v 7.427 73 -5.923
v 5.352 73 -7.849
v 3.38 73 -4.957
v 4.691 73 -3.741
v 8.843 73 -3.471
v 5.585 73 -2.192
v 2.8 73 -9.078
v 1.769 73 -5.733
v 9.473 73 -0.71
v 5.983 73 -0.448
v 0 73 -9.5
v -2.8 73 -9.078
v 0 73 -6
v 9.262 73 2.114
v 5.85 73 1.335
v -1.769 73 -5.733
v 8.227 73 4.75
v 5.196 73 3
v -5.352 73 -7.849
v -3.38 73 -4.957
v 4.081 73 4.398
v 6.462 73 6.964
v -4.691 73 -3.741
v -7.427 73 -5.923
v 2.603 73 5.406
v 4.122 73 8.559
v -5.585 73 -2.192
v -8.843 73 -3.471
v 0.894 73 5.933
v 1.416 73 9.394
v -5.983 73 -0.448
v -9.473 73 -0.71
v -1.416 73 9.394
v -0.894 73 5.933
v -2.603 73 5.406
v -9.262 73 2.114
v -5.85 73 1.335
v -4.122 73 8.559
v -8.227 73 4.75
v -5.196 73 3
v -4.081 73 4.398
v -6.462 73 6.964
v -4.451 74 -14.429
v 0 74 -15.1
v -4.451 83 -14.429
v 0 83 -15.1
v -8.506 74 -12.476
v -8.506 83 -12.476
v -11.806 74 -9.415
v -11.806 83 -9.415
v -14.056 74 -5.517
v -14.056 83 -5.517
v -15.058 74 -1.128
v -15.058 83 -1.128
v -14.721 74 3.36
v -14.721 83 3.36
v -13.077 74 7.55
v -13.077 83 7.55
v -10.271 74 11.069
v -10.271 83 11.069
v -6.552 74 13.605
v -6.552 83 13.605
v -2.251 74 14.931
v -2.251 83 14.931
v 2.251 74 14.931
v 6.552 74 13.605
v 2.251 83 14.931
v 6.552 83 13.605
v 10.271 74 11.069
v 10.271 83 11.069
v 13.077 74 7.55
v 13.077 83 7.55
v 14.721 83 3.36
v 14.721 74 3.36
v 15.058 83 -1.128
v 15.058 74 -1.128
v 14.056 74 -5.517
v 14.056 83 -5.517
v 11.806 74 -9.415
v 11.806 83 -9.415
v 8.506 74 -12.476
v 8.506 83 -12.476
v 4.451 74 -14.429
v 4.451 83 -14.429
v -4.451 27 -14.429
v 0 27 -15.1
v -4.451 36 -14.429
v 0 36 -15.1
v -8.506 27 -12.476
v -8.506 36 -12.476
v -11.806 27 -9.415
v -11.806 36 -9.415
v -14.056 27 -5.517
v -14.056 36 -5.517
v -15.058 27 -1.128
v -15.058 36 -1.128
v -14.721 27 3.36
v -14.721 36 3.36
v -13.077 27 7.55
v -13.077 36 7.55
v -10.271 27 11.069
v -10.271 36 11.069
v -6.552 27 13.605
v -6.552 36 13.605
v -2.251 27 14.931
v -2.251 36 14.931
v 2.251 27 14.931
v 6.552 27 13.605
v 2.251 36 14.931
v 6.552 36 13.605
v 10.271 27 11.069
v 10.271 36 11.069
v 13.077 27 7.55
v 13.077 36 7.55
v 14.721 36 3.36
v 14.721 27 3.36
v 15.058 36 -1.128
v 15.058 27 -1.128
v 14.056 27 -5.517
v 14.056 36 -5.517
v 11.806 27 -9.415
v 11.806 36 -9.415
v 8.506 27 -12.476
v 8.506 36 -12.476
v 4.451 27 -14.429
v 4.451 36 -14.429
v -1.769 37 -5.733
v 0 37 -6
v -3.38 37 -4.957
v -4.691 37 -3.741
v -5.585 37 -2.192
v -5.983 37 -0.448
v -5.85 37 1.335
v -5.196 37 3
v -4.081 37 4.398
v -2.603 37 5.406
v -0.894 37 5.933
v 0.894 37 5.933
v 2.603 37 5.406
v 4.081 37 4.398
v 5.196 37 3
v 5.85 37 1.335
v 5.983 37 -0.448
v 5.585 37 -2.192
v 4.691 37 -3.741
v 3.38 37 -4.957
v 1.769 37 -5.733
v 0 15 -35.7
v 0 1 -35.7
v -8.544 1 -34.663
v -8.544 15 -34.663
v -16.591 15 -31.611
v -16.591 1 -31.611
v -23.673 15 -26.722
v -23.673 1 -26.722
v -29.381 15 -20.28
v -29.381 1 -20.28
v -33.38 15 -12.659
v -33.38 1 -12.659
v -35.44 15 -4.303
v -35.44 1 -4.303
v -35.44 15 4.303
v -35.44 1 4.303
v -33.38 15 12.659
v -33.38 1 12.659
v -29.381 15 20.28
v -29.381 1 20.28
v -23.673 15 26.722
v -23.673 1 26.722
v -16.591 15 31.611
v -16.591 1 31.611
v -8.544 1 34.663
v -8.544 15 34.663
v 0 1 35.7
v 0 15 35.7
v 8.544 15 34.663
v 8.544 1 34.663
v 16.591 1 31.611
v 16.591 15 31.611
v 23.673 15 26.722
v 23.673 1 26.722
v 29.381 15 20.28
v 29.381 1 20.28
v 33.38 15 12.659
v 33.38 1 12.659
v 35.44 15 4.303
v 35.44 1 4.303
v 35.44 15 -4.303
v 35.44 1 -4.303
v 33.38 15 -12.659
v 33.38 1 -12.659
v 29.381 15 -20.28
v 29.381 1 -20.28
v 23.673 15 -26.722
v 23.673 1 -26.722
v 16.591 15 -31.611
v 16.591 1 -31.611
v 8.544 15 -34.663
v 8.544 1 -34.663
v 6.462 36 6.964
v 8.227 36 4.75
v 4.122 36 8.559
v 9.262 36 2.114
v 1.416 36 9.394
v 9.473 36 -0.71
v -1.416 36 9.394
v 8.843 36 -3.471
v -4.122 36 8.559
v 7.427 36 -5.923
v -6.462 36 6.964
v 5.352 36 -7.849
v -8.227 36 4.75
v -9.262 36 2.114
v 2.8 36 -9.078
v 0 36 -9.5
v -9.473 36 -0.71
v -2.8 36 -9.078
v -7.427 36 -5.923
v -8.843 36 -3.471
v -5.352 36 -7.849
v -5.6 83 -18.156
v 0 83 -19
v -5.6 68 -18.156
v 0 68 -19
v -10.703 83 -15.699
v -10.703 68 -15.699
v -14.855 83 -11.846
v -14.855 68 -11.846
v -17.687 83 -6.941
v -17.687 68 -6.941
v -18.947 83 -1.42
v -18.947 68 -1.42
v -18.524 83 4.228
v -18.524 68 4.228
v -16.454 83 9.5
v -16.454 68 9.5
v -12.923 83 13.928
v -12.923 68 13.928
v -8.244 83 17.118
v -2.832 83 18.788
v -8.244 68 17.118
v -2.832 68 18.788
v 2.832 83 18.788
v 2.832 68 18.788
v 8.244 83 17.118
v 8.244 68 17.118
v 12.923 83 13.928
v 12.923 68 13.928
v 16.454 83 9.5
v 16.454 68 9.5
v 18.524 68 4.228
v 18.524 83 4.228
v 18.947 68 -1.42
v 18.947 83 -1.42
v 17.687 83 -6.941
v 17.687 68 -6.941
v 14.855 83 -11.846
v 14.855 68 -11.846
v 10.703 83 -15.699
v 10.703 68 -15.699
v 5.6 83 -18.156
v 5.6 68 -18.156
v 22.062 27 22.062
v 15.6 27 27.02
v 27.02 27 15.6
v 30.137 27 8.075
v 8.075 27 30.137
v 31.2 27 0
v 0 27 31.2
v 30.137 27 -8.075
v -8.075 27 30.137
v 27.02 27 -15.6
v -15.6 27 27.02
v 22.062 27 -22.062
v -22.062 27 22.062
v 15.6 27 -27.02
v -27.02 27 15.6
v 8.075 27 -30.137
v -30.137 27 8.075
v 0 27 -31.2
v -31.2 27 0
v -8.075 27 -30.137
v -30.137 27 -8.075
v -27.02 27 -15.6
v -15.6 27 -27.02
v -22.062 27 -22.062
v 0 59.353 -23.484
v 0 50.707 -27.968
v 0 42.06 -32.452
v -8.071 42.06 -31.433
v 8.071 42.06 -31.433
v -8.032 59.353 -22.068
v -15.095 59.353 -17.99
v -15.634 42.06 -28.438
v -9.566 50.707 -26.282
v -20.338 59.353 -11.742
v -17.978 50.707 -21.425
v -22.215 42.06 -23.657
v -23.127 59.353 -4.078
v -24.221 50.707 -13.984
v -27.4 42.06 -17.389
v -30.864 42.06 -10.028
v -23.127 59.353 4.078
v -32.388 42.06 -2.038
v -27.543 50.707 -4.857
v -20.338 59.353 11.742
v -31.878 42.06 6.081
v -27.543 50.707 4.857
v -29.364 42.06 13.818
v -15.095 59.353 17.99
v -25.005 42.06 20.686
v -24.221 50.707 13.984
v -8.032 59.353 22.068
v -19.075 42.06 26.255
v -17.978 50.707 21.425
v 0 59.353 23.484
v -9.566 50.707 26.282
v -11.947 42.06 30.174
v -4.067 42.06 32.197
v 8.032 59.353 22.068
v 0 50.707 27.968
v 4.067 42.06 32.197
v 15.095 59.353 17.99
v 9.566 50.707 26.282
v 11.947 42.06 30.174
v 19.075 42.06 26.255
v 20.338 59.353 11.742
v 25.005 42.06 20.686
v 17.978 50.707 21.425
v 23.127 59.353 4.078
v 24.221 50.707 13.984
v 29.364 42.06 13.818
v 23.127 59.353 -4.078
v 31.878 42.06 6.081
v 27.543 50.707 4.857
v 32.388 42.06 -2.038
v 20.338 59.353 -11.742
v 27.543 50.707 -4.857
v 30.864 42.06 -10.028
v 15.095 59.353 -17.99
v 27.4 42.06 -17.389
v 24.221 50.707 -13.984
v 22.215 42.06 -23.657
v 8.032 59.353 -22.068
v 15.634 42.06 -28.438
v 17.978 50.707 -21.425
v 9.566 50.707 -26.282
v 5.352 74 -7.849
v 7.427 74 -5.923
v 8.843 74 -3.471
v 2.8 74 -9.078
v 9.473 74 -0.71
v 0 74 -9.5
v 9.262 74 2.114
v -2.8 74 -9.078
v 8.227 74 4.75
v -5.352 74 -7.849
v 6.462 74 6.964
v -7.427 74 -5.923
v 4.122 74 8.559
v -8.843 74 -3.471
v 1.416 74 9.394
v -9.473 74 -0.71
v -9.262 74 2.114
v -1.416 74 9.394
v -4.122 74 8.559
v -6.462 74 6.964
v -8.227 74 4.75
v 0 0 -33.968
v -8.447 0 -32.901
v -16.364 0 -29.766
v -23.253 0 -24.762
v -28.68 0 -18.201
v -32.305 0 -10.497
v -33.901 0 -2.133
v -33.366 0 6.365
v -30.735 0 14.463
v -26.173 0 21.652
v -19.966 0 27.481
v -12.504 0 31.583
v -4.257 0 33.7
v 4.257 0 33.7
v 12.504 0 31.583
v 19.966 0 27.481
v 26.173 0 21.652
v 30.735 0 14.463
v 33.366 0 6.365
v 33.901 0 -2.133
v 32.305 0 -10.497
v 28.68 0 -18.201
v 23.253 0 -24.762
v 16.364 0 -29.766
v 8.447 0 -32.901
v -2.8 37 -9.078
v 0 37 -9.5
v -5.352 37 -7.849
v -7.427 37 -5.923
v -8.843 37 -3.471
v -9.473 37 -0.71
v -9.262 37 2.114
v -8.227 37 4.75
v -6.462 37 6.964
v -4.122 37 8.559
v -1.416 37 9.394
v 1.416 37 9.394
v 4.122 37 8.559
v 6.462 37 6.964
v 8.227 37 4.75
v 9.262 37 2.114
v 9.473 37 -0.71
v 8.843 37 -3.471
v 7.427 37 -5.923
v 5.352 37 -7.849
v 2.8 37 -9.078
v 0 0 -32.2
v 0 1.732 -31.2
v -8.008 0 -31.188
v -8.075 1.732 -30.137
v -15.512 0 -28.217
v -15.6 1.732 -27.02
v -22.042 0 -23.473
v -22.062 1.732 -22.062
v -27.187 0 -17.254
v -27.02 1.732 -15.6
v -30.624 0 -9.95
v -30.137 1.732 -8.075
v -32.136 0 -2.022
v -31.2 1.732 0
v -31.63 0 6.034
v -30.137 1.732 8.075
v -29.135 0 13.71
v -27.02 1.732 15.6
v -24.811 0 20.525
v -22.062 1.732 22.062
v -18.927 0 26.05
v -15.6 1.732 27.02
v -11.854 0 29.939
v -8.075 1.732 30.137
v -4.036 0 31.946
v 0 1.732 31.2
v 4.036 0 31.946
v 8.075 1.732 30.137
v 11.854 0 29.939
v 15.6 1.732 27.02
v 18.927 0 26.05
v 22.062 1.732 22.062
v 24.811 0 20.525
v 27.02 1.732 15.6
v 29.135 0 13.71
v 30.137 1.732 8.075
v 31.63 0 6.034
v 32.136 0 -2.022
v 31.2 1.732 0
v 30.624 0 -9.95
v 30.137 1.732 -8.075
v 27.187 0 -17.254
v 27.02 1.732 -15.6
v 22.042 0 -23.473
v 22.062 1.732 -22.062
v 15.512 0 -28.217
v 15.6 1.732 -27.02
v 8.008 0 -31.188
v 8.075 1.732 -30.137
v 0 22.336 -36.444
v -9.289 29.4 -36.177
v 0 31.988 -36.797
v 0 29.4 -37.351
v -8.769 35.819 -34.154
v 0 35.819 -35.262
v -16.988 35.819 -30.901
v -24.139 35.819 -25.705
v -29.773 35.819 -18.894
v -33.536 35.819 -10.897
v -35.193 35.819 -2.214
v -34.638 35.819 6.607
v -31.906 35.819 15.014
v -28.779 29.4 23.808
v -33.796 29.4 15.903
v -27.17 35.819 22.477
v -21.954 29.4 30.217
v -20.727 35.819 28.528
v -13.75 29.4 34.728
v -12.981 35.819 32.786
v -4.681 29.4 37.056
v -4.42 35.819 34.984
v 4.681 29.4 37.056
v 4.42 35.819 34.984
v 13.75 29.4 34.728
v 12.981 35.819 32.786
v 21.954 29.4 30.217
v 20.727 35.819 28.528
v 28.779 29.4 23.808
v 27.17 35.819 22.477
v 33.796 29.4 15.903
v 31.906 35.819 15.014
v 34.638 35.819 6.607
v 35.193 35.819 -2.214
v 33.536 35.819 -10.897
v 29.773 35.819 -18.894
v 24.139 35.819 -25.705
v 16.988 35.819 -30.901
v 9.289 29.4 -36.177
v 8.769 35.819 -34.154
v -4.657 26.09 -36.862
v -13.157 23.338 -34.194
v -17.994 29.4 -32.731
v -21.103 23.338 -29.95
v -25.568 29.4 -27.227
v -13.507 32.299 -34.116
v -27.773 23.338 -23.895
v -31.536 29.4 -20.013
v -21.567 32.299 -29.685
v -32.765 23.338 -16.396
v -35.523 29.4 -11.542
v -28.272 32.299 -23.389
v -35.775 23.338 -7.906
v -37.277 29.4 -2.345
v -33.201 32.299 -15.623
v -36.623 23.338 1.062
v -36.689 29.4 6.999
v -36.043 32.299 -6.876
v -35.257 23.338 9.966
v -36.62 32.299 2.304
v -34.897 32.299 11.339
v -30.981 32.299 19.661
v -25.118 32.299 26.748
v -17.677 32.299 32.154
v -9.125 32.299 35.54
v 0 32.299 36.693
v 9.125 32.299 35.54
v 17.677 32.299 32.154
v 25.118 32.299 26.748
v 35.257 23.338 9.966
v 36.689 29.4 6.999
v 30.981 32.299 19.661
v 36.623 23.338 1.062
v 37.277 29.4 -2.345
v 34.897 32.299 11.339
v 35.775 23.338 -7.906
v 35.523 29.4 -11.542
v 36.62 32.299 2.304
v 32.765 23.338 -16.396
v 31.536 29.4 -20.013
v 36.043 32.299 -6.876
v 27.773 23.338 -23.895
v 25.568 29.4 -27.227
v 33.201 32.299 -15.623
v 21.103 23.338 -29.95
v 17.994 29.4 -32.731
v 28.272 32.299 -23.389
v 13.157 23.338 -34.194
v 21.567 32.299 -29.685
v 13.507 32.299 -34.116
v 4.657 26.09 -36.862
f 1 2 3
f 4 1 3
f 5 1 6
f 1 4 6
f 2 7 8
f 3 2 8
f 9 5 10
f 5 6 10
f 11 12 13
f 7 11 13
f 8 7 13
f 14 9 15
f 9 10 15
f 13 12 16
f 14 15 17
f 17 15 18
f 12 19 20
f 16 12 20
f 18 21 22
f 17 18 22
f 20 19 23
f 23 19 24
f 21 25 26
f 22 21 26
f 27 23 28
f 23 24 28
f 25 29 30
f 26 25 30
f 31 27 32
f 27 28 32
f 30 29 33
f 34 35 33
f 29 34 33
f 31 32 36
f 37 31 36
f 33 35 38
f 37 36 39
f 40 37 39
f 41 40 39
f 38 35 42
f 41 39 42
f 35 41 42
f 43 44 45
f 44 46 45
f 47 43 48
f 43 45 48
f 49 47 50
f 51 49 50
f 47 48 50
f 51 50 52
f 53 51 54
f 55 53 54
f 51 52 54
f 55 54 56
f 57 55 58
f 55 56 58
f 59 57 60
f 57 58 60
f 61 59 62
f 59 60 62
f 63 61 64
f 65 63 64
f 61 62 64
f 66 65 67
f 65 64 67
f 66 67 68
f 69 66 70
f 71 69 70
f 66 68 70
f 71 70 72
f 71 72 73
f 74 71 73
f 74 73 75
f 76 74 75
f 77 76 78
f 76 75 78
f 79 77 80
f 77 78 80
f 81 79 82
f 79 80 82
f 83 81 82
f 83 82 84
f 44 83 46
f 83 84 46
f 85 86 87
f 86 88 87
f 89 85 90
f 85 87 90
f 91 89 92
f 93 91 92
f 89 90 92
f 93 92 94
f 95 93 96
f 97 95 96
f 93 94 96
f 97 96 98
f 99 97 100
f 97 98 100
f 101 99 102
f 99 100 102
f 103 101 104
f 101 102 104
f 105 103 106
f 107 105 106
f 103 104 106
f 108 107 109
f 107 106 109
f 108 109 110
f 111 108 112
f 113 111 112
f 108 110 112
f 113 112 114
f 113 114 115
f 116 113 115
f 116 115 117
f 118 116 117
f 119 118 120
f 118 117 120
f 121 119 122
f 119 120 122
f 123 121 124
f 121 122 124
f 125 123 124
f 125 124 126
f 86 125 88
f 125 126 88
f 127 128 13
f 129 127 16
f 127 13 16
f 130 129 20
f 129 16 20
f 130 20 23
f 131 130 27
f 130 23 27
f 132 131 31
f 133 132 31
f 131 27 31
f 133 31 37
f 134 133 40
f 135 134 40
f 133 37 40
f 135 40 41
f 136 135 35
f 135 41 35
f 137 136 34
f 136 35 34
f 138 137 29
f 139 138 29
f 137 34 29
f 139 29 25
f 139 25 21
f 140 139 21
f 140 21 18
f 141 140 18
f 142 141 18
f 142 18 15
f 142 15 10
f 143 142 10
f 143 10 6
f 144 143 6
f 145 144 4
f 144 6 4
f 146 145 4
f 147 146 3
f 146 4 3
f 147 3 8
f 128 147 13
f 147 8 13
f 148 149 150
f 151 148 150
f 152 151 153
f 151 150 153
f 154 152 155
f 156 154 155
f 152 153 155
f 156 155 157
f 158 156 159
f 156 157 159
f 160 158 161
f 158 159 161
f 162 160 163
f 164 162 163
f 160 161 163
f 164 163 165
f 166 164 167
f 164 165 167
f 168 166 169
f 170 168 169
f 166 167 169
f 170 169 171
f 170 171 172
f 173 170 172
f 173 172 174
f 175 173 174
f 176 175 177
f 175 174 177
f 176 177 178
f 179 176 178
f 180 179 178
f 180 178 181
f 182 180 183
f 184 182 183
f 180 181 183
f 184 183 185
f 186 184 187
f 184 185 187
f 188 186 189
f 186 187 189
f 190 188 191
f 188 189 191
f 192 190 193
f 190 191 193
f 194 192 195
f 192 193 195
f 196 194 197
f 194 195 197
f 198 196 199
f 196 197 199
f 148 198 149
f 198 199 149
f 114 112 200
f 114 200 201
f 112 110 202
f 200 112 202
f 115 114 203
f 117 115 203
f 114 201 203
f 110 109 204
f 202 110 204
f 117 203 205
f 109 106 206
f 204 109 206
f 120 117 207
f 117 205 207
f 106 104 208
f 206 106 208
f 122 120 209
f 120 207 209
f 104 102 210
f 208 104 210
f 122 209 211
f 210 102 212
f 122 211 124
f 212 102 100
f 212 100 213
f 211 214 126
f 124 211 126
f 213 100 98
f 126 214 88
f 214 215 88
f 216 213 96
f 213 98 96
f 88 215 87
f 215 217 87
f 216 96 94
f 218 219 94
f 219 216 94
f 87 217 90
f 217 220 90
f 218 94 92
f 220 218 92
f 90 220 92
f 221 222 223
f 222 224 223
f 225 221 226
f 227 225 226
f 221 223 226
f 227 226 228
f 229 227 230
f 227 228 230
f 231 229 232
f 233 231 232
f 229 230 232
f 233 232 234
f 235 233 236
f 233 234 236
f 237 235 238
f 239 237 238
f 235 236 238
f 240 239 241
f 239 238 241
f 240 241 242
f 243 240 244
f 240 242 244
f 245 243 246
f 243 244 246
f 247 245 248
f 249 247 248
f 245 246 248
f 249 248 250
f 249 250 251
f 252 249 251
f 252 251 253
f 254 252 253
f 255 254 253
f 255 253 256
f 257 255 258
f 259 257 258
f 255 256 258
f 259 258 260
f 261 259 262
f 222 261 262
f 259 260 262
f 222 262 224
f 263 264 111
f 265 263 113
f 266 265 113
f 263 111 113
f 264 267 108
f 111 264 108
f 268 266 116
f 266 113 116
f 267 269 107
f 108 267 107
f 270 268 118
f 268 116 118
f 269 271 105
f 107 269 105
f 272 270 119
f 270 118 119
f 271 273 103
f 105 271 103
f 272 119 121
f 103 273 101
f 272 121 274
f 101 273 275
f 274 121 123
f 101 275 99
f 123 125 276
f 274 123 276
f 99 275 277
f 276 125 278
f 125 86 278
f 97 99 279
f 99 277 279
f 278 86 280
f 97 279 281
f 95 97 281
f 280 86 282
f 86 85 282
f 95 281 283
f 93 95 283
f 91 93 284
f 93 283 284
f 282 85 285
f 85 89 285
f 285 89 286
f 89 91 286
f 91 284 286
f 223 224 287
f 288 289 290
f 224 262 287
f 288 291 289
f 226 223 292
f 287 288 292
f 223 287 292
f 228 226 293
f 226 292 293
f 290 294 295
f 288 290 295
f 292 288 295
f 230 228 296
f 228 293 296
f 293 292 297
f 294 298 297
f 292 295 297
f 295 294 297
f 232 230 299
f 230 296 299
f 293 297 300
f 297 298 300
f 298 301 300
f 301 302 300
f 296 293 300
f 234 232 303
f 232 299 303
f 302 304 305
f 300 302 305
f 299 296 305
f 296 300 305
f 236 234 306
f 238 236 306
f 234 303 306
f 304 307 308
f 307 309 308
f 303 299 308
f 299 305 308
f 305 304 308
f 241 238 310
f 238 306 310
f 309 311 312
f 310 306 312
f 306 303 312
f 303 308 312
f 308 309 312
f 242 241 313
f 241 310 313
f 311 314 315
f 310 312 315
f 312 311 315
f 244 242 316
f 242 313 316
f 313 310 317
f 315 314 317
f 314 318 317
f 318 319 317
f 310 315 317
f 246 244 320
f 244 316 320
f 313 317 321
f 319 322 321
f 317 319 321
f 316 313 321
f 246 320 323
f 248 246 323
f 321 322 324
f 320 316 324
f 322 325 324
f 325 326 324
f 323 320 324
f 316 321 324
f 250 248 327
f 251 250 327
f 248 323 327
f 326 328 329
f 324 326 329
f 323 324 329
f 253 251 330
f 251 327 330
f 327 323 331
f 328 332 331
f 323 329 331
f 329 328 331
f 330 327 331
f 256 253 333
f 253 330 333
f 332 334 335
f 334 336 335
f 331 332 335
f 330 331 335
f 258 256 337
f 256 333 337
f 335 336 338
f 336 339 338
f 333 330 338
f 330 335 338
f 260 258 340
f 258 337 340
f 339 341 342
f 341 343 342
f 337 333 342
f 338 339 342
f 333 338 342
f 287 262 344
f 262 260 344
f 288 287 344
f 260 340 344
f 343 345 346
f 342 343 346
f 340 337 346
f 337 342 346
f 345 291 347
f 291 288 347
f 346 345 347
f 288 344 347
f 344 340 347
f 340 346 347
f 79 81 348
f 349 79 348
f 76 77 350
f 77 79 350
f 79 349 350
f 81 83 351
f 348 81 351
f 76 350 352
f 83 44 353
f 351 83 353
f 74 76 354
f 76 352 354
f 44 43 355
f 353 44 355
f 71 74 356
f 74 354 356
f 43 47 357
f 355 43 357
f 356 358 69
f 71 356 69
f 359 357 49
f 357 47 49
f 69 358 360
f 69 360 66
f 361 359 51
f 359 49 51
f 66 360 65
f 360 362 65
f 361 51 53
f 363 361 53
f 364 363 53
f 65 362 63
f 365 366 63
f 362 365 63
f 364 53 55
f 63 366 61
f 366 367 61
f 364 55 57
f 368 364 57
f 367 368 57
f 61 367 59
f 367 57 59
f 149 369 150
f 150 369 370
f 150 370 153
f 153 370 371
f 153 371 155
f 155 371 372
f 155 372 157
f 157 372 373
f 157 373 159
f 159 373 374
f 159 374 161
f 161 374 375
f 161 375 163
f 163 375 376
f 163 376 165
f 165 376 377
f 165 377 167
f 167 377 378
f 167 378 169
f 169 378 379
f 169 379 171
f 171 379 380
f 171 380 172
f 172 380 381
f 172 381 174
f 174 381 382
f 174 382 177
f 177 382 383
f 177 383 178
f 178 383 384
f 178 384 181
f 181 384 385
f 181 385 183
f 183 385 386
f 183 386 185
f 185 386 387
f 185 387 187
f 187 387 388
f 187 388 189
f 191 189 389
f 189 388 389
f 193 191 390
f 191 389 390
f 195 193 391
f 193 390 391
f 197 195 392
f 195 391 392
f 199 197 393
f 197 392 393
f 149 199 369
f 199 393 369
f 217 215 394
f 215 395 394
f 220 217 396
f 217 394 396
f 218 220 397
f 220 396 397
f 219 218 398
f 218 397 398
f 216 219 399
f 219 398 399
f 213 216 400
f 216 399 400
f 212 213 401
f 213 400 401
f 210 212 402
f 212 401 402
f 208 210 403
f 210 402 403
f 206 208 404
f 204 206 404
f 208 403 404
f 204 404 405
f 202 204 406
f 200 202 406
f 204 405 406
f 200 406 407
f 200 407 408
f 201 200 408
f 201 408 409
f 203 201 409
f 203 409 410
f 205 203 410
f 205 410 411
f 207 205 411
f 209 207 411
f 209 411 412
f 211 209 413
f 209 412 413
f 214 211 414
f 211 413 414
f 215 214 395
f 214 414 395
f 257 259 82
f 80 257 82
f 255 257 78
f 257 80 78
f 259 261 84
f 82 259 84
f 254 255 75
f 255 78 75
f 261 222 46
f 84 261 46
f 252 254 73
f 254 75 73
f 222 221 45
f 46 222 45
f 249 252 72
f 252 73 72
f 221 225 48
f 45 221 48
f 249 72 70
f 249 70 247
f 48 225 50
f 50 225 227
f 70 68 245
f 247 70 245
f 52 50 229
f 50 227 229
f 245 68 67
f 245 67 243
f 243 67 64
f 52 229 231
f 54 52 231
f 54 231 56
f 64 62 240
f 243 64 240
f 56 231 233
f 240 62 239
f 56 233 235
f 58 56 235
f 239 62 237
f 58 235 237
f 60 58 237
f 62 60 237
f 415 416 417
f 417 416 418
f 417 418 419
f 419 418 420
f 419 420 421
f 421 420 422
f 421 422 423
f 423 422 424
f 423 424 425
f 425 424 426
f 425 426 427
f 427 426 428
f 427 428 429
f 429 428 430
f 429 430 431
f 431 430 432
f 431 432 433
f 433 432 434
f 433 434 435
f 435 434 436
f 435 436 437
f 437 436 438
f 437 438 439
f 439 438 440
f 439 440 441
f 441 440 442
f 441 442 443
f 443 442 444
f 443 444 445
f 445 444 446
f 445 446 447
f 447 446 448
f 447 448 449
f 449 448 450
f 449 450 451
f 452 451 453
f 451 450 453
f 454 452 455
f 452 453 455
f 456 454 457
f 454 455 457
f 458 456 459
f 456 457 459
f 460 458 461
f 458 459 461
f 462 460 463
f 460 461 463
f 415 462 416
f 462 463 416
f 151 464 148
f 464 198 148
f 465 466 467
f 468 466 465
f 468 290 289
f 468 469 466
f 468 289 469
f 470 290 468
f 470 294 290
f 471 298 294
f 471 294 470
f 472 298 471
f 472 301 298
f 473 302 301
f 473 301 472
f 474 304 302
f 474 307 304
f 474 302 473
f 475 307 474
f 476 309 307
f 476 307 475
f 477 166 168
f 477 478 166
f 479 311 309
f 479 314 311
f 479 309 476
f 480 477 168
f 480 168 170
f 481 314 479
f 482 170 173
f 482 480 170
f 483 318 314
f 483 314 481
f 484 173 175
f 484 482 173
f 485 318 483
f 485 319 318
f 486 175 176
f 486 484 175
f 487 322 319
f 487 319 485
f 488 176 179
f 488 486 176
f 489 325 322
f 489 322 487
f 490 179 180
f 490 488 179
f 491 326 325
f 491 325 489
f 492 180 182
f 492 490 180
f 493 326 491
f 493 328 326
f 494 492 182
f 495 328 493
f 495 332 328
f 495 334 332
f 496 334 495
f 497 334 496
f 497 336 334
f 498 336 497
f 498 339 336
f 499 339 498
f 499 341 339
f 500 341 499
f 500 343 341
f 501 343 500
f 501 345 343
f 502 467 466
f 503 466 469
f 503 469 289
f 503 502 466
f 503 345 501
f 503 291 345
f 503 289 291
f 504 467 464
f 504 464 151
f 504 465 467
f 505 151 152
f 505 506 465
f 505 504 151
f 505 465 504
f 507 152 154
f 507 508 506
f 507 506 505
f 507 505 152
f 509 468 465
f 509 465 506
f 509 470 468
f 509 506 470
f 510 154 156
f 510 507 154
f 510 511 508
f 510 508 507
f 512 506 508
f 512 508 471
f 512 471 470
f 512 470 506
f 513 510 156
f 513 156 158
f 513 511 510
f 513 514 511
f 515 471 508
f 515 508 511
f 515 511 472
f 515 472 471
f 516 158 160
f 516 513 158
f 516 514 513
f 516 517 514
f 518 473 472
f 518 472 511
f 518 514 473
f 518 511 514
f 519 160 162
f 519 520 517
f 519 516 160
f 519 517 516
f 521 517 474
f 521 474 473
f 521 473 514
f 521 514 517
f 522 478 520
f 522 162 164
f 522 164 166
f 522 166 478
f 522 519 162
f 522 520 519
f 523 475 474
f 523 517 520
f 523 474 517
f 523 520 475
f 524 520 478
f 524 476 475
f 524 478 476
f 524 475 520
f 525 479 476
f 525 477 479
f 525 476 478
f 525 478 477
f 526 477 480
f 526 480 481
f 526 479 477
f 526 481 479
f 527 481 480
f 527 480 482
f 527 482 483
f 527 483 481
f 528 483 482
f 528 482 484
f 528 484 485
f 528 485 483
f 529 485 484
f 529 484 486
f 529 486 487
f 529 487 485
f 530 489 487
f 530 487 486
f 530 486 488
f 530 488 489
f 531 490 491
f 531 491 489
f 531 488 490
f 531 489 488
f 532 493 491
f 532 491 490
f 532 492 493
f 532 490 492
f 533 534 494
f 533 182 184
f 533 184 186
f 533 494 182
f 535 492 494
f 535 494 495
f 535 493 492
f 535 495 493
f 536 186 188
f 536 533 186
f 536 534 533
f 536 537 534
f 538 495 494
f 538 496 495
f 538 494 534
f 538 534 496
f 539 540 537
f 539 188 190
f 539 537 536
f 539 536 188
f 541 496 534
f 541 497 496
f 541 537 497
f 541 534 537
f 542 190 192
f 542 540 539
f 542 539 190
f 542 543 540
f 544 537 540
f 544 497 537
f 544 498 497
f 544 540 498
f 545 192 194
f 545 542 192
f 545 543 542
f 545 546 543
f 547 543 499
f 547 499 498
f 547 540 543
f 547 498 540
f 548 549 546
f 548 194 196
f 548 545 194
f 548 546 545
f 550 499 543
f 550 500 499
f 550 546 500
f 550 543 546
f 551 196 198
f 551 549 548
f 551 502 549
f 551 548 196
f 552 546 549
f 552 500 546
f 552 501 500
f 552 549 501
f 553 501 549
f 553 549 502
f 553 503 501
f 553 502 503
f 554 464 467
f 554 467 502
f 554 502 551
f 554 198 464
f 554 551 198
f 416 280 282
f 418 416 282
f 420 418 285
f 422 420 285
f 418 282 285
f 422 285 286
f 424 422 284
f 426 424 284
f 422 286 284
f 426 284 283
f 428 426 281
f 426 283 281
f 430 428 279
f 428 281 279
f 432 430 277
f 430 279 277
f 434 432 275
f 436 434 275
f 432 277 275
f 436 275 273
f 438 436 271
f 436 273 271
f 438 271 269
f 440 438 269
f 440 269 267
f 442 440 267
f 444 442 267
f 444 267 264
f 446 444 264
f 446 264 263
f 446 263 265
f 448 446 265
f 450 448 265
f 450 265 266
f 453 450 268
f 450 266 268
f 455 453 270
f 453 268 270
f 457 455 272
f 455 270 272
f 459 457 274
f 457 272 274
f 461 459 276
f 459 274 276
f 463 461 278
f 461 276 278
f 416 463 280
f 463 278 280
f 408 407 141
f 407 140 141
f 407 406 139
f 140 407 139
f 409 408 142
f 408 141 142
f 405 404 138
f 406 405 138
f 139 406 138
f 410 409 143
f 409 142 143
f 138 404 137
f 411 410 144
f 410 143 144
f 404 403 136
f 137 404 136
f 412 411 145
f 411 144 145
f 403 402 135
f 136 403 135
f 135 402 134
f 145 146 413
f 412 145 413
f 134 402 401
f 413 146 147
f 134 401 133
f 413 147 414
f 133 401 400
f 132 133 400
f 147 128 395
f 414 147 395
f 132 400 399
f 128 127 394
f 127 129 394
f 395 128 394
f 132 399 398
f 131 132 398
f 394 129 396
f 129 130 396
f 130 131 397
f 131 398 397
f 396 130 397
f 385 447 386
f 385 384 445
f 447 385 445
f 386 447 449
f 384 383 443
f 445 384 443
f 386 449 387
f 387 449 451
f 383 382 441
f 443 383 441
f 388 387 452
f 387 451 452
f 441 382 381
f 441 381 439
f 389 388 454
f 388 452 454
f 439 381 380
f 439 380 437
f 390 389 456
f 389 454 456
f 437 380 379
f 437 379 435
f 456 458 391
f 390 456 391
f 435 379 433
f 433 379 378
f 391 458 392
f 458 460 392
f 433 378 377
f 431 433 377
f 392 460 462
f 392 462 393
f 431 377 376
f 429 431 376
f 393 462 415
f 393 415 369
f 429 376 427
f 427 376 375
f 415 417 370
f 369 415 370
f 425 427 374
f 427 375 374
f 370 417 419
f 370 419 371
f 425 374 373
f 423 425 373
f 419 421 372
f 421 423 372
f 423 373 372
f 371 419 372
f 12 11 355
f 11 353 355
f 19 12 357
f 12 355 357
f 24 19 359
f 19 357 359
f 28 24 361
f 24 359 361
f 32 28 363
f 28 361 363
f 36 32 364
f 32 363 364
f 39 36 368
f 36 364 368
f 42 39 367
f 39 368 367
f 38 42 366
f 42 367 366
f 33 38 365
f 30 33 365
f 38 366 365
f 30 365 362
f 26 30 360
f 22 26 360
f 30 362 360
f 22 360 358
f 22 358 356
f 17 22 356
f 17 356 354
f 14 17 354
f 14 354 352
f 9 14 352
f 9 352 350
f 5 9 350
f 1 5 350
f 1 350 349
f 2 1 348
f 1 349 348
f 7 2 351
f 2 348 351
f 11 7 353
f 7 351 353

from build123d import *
from OCP.BRepFilletAPI import BRepFilletAPI_MakeChamfer

# Parameters (mm, degrees)
CHAMFER3_SIZE  = 1
CHAMFER3_SIZE2 = 1.732050808


with BuildPart() as part:
    # Sketch10 → Revolve1 (revolve)
    with BuildSketch(Plane(origin=(0, 0, 0), x_dir=(0, 0, -1), z_dir=(1, 0, 0)), mode=Mode.PRIVATE) as revolve1_sk:
        with BuildLine():
            Line((-6, 37), (-6, 73))
            Line((-6, 73), (-9.5, 73))
            Line((-9.5, 73), (-9.5, 74))
            Line((-9.5, 74), (-15.1, 74))
            Line((-15.1, 74), (-15.1, 83))
            Line((-15.1, 83), (-19, 83))
            Line((-19, 83), (-19, 68))
            Line((-19, 68), (-32.452427699, 42.060005436))
            add(Edge.make_bspline(
                [(-35.7, 15), (-35.7, 21.998470468), (-38.17114104, 26.621891379), (-36.358239491, 34.061117095), (-33.190750064, 40.03148141), (-32.452427699, 42.060005436)],
                knots=[0, 0, 0, 0, 0.519622211, 0.619622211, 1, 1, 1, 1], degree=3))
            Line((-35.7, 15), (-35.7, 0))
            Line((-35.7, 0), (-31.2, 0))
            Line((-31.2, 0), (-31.2, 27))
            Line((-31.2, 27), (-15.1, 27))
            Line((-15.1, 27), (-15.1, 36))
            Line((-15.1, 36), (-9.5, 36))
            Line((-9.5, 36), (-9.5, 37))
            Line((-9.5, 37), (-6, 37))
        make_face()
    revolve(revolve1_sk.sketch.rotate(Axis((0, 0, 0), (0, 1, 0)), 180), axis=Axis((0, 0, 0), (0, 1, 0)))

    # Chamfer3: one chamfer whose edges measure the first distance from different faces: ONE call of the kernel's chamfer builder (chamfer() names one face for all edges)
    chamfer3_edges_1 = [part.edges().sort_by_distance(p)[0] for p in [
        (0, 0, 35.7),
    ]]
    chamfer3_side_1 = [part.faces().sort_by_distance(p)[0] for p in [
        (0, 7.5, 35.7),
    ]]
    chamfer3_edges_2 = [part.edges().sort_by_distance(p)[0] for p in [
        (0, 0, 31.2),
    ]]
    chamfer3_side_2 = [part.faces().sort_by_distance(p)[0] for p in [
        (0, 0, 34.690251516),
    ]]
    chamfer3 = BRepFilletAPI_MakeChamfer(part.part.solid().wrapped)
    for e in chamfer3_edges_1:
        chamfer3.Add(CHAMFER3_SIZE, CHAMFER3_SIZE2, e.wrapped, chamfer3_side_1[0].wrapped)  # the first distance lies on this face
    for e in chamfer3_edges_2:
        chamfer3.Add(CHAMFER3_SIZE, CHAMFER3_SIZE2, e.wrapped, chamfer3_side_2[0].wrapped)  # the first distance lies on this face
    add(Compound.cast(chamfer3.Shape()), mode=Mode.REPLACE)


solid = part.part
